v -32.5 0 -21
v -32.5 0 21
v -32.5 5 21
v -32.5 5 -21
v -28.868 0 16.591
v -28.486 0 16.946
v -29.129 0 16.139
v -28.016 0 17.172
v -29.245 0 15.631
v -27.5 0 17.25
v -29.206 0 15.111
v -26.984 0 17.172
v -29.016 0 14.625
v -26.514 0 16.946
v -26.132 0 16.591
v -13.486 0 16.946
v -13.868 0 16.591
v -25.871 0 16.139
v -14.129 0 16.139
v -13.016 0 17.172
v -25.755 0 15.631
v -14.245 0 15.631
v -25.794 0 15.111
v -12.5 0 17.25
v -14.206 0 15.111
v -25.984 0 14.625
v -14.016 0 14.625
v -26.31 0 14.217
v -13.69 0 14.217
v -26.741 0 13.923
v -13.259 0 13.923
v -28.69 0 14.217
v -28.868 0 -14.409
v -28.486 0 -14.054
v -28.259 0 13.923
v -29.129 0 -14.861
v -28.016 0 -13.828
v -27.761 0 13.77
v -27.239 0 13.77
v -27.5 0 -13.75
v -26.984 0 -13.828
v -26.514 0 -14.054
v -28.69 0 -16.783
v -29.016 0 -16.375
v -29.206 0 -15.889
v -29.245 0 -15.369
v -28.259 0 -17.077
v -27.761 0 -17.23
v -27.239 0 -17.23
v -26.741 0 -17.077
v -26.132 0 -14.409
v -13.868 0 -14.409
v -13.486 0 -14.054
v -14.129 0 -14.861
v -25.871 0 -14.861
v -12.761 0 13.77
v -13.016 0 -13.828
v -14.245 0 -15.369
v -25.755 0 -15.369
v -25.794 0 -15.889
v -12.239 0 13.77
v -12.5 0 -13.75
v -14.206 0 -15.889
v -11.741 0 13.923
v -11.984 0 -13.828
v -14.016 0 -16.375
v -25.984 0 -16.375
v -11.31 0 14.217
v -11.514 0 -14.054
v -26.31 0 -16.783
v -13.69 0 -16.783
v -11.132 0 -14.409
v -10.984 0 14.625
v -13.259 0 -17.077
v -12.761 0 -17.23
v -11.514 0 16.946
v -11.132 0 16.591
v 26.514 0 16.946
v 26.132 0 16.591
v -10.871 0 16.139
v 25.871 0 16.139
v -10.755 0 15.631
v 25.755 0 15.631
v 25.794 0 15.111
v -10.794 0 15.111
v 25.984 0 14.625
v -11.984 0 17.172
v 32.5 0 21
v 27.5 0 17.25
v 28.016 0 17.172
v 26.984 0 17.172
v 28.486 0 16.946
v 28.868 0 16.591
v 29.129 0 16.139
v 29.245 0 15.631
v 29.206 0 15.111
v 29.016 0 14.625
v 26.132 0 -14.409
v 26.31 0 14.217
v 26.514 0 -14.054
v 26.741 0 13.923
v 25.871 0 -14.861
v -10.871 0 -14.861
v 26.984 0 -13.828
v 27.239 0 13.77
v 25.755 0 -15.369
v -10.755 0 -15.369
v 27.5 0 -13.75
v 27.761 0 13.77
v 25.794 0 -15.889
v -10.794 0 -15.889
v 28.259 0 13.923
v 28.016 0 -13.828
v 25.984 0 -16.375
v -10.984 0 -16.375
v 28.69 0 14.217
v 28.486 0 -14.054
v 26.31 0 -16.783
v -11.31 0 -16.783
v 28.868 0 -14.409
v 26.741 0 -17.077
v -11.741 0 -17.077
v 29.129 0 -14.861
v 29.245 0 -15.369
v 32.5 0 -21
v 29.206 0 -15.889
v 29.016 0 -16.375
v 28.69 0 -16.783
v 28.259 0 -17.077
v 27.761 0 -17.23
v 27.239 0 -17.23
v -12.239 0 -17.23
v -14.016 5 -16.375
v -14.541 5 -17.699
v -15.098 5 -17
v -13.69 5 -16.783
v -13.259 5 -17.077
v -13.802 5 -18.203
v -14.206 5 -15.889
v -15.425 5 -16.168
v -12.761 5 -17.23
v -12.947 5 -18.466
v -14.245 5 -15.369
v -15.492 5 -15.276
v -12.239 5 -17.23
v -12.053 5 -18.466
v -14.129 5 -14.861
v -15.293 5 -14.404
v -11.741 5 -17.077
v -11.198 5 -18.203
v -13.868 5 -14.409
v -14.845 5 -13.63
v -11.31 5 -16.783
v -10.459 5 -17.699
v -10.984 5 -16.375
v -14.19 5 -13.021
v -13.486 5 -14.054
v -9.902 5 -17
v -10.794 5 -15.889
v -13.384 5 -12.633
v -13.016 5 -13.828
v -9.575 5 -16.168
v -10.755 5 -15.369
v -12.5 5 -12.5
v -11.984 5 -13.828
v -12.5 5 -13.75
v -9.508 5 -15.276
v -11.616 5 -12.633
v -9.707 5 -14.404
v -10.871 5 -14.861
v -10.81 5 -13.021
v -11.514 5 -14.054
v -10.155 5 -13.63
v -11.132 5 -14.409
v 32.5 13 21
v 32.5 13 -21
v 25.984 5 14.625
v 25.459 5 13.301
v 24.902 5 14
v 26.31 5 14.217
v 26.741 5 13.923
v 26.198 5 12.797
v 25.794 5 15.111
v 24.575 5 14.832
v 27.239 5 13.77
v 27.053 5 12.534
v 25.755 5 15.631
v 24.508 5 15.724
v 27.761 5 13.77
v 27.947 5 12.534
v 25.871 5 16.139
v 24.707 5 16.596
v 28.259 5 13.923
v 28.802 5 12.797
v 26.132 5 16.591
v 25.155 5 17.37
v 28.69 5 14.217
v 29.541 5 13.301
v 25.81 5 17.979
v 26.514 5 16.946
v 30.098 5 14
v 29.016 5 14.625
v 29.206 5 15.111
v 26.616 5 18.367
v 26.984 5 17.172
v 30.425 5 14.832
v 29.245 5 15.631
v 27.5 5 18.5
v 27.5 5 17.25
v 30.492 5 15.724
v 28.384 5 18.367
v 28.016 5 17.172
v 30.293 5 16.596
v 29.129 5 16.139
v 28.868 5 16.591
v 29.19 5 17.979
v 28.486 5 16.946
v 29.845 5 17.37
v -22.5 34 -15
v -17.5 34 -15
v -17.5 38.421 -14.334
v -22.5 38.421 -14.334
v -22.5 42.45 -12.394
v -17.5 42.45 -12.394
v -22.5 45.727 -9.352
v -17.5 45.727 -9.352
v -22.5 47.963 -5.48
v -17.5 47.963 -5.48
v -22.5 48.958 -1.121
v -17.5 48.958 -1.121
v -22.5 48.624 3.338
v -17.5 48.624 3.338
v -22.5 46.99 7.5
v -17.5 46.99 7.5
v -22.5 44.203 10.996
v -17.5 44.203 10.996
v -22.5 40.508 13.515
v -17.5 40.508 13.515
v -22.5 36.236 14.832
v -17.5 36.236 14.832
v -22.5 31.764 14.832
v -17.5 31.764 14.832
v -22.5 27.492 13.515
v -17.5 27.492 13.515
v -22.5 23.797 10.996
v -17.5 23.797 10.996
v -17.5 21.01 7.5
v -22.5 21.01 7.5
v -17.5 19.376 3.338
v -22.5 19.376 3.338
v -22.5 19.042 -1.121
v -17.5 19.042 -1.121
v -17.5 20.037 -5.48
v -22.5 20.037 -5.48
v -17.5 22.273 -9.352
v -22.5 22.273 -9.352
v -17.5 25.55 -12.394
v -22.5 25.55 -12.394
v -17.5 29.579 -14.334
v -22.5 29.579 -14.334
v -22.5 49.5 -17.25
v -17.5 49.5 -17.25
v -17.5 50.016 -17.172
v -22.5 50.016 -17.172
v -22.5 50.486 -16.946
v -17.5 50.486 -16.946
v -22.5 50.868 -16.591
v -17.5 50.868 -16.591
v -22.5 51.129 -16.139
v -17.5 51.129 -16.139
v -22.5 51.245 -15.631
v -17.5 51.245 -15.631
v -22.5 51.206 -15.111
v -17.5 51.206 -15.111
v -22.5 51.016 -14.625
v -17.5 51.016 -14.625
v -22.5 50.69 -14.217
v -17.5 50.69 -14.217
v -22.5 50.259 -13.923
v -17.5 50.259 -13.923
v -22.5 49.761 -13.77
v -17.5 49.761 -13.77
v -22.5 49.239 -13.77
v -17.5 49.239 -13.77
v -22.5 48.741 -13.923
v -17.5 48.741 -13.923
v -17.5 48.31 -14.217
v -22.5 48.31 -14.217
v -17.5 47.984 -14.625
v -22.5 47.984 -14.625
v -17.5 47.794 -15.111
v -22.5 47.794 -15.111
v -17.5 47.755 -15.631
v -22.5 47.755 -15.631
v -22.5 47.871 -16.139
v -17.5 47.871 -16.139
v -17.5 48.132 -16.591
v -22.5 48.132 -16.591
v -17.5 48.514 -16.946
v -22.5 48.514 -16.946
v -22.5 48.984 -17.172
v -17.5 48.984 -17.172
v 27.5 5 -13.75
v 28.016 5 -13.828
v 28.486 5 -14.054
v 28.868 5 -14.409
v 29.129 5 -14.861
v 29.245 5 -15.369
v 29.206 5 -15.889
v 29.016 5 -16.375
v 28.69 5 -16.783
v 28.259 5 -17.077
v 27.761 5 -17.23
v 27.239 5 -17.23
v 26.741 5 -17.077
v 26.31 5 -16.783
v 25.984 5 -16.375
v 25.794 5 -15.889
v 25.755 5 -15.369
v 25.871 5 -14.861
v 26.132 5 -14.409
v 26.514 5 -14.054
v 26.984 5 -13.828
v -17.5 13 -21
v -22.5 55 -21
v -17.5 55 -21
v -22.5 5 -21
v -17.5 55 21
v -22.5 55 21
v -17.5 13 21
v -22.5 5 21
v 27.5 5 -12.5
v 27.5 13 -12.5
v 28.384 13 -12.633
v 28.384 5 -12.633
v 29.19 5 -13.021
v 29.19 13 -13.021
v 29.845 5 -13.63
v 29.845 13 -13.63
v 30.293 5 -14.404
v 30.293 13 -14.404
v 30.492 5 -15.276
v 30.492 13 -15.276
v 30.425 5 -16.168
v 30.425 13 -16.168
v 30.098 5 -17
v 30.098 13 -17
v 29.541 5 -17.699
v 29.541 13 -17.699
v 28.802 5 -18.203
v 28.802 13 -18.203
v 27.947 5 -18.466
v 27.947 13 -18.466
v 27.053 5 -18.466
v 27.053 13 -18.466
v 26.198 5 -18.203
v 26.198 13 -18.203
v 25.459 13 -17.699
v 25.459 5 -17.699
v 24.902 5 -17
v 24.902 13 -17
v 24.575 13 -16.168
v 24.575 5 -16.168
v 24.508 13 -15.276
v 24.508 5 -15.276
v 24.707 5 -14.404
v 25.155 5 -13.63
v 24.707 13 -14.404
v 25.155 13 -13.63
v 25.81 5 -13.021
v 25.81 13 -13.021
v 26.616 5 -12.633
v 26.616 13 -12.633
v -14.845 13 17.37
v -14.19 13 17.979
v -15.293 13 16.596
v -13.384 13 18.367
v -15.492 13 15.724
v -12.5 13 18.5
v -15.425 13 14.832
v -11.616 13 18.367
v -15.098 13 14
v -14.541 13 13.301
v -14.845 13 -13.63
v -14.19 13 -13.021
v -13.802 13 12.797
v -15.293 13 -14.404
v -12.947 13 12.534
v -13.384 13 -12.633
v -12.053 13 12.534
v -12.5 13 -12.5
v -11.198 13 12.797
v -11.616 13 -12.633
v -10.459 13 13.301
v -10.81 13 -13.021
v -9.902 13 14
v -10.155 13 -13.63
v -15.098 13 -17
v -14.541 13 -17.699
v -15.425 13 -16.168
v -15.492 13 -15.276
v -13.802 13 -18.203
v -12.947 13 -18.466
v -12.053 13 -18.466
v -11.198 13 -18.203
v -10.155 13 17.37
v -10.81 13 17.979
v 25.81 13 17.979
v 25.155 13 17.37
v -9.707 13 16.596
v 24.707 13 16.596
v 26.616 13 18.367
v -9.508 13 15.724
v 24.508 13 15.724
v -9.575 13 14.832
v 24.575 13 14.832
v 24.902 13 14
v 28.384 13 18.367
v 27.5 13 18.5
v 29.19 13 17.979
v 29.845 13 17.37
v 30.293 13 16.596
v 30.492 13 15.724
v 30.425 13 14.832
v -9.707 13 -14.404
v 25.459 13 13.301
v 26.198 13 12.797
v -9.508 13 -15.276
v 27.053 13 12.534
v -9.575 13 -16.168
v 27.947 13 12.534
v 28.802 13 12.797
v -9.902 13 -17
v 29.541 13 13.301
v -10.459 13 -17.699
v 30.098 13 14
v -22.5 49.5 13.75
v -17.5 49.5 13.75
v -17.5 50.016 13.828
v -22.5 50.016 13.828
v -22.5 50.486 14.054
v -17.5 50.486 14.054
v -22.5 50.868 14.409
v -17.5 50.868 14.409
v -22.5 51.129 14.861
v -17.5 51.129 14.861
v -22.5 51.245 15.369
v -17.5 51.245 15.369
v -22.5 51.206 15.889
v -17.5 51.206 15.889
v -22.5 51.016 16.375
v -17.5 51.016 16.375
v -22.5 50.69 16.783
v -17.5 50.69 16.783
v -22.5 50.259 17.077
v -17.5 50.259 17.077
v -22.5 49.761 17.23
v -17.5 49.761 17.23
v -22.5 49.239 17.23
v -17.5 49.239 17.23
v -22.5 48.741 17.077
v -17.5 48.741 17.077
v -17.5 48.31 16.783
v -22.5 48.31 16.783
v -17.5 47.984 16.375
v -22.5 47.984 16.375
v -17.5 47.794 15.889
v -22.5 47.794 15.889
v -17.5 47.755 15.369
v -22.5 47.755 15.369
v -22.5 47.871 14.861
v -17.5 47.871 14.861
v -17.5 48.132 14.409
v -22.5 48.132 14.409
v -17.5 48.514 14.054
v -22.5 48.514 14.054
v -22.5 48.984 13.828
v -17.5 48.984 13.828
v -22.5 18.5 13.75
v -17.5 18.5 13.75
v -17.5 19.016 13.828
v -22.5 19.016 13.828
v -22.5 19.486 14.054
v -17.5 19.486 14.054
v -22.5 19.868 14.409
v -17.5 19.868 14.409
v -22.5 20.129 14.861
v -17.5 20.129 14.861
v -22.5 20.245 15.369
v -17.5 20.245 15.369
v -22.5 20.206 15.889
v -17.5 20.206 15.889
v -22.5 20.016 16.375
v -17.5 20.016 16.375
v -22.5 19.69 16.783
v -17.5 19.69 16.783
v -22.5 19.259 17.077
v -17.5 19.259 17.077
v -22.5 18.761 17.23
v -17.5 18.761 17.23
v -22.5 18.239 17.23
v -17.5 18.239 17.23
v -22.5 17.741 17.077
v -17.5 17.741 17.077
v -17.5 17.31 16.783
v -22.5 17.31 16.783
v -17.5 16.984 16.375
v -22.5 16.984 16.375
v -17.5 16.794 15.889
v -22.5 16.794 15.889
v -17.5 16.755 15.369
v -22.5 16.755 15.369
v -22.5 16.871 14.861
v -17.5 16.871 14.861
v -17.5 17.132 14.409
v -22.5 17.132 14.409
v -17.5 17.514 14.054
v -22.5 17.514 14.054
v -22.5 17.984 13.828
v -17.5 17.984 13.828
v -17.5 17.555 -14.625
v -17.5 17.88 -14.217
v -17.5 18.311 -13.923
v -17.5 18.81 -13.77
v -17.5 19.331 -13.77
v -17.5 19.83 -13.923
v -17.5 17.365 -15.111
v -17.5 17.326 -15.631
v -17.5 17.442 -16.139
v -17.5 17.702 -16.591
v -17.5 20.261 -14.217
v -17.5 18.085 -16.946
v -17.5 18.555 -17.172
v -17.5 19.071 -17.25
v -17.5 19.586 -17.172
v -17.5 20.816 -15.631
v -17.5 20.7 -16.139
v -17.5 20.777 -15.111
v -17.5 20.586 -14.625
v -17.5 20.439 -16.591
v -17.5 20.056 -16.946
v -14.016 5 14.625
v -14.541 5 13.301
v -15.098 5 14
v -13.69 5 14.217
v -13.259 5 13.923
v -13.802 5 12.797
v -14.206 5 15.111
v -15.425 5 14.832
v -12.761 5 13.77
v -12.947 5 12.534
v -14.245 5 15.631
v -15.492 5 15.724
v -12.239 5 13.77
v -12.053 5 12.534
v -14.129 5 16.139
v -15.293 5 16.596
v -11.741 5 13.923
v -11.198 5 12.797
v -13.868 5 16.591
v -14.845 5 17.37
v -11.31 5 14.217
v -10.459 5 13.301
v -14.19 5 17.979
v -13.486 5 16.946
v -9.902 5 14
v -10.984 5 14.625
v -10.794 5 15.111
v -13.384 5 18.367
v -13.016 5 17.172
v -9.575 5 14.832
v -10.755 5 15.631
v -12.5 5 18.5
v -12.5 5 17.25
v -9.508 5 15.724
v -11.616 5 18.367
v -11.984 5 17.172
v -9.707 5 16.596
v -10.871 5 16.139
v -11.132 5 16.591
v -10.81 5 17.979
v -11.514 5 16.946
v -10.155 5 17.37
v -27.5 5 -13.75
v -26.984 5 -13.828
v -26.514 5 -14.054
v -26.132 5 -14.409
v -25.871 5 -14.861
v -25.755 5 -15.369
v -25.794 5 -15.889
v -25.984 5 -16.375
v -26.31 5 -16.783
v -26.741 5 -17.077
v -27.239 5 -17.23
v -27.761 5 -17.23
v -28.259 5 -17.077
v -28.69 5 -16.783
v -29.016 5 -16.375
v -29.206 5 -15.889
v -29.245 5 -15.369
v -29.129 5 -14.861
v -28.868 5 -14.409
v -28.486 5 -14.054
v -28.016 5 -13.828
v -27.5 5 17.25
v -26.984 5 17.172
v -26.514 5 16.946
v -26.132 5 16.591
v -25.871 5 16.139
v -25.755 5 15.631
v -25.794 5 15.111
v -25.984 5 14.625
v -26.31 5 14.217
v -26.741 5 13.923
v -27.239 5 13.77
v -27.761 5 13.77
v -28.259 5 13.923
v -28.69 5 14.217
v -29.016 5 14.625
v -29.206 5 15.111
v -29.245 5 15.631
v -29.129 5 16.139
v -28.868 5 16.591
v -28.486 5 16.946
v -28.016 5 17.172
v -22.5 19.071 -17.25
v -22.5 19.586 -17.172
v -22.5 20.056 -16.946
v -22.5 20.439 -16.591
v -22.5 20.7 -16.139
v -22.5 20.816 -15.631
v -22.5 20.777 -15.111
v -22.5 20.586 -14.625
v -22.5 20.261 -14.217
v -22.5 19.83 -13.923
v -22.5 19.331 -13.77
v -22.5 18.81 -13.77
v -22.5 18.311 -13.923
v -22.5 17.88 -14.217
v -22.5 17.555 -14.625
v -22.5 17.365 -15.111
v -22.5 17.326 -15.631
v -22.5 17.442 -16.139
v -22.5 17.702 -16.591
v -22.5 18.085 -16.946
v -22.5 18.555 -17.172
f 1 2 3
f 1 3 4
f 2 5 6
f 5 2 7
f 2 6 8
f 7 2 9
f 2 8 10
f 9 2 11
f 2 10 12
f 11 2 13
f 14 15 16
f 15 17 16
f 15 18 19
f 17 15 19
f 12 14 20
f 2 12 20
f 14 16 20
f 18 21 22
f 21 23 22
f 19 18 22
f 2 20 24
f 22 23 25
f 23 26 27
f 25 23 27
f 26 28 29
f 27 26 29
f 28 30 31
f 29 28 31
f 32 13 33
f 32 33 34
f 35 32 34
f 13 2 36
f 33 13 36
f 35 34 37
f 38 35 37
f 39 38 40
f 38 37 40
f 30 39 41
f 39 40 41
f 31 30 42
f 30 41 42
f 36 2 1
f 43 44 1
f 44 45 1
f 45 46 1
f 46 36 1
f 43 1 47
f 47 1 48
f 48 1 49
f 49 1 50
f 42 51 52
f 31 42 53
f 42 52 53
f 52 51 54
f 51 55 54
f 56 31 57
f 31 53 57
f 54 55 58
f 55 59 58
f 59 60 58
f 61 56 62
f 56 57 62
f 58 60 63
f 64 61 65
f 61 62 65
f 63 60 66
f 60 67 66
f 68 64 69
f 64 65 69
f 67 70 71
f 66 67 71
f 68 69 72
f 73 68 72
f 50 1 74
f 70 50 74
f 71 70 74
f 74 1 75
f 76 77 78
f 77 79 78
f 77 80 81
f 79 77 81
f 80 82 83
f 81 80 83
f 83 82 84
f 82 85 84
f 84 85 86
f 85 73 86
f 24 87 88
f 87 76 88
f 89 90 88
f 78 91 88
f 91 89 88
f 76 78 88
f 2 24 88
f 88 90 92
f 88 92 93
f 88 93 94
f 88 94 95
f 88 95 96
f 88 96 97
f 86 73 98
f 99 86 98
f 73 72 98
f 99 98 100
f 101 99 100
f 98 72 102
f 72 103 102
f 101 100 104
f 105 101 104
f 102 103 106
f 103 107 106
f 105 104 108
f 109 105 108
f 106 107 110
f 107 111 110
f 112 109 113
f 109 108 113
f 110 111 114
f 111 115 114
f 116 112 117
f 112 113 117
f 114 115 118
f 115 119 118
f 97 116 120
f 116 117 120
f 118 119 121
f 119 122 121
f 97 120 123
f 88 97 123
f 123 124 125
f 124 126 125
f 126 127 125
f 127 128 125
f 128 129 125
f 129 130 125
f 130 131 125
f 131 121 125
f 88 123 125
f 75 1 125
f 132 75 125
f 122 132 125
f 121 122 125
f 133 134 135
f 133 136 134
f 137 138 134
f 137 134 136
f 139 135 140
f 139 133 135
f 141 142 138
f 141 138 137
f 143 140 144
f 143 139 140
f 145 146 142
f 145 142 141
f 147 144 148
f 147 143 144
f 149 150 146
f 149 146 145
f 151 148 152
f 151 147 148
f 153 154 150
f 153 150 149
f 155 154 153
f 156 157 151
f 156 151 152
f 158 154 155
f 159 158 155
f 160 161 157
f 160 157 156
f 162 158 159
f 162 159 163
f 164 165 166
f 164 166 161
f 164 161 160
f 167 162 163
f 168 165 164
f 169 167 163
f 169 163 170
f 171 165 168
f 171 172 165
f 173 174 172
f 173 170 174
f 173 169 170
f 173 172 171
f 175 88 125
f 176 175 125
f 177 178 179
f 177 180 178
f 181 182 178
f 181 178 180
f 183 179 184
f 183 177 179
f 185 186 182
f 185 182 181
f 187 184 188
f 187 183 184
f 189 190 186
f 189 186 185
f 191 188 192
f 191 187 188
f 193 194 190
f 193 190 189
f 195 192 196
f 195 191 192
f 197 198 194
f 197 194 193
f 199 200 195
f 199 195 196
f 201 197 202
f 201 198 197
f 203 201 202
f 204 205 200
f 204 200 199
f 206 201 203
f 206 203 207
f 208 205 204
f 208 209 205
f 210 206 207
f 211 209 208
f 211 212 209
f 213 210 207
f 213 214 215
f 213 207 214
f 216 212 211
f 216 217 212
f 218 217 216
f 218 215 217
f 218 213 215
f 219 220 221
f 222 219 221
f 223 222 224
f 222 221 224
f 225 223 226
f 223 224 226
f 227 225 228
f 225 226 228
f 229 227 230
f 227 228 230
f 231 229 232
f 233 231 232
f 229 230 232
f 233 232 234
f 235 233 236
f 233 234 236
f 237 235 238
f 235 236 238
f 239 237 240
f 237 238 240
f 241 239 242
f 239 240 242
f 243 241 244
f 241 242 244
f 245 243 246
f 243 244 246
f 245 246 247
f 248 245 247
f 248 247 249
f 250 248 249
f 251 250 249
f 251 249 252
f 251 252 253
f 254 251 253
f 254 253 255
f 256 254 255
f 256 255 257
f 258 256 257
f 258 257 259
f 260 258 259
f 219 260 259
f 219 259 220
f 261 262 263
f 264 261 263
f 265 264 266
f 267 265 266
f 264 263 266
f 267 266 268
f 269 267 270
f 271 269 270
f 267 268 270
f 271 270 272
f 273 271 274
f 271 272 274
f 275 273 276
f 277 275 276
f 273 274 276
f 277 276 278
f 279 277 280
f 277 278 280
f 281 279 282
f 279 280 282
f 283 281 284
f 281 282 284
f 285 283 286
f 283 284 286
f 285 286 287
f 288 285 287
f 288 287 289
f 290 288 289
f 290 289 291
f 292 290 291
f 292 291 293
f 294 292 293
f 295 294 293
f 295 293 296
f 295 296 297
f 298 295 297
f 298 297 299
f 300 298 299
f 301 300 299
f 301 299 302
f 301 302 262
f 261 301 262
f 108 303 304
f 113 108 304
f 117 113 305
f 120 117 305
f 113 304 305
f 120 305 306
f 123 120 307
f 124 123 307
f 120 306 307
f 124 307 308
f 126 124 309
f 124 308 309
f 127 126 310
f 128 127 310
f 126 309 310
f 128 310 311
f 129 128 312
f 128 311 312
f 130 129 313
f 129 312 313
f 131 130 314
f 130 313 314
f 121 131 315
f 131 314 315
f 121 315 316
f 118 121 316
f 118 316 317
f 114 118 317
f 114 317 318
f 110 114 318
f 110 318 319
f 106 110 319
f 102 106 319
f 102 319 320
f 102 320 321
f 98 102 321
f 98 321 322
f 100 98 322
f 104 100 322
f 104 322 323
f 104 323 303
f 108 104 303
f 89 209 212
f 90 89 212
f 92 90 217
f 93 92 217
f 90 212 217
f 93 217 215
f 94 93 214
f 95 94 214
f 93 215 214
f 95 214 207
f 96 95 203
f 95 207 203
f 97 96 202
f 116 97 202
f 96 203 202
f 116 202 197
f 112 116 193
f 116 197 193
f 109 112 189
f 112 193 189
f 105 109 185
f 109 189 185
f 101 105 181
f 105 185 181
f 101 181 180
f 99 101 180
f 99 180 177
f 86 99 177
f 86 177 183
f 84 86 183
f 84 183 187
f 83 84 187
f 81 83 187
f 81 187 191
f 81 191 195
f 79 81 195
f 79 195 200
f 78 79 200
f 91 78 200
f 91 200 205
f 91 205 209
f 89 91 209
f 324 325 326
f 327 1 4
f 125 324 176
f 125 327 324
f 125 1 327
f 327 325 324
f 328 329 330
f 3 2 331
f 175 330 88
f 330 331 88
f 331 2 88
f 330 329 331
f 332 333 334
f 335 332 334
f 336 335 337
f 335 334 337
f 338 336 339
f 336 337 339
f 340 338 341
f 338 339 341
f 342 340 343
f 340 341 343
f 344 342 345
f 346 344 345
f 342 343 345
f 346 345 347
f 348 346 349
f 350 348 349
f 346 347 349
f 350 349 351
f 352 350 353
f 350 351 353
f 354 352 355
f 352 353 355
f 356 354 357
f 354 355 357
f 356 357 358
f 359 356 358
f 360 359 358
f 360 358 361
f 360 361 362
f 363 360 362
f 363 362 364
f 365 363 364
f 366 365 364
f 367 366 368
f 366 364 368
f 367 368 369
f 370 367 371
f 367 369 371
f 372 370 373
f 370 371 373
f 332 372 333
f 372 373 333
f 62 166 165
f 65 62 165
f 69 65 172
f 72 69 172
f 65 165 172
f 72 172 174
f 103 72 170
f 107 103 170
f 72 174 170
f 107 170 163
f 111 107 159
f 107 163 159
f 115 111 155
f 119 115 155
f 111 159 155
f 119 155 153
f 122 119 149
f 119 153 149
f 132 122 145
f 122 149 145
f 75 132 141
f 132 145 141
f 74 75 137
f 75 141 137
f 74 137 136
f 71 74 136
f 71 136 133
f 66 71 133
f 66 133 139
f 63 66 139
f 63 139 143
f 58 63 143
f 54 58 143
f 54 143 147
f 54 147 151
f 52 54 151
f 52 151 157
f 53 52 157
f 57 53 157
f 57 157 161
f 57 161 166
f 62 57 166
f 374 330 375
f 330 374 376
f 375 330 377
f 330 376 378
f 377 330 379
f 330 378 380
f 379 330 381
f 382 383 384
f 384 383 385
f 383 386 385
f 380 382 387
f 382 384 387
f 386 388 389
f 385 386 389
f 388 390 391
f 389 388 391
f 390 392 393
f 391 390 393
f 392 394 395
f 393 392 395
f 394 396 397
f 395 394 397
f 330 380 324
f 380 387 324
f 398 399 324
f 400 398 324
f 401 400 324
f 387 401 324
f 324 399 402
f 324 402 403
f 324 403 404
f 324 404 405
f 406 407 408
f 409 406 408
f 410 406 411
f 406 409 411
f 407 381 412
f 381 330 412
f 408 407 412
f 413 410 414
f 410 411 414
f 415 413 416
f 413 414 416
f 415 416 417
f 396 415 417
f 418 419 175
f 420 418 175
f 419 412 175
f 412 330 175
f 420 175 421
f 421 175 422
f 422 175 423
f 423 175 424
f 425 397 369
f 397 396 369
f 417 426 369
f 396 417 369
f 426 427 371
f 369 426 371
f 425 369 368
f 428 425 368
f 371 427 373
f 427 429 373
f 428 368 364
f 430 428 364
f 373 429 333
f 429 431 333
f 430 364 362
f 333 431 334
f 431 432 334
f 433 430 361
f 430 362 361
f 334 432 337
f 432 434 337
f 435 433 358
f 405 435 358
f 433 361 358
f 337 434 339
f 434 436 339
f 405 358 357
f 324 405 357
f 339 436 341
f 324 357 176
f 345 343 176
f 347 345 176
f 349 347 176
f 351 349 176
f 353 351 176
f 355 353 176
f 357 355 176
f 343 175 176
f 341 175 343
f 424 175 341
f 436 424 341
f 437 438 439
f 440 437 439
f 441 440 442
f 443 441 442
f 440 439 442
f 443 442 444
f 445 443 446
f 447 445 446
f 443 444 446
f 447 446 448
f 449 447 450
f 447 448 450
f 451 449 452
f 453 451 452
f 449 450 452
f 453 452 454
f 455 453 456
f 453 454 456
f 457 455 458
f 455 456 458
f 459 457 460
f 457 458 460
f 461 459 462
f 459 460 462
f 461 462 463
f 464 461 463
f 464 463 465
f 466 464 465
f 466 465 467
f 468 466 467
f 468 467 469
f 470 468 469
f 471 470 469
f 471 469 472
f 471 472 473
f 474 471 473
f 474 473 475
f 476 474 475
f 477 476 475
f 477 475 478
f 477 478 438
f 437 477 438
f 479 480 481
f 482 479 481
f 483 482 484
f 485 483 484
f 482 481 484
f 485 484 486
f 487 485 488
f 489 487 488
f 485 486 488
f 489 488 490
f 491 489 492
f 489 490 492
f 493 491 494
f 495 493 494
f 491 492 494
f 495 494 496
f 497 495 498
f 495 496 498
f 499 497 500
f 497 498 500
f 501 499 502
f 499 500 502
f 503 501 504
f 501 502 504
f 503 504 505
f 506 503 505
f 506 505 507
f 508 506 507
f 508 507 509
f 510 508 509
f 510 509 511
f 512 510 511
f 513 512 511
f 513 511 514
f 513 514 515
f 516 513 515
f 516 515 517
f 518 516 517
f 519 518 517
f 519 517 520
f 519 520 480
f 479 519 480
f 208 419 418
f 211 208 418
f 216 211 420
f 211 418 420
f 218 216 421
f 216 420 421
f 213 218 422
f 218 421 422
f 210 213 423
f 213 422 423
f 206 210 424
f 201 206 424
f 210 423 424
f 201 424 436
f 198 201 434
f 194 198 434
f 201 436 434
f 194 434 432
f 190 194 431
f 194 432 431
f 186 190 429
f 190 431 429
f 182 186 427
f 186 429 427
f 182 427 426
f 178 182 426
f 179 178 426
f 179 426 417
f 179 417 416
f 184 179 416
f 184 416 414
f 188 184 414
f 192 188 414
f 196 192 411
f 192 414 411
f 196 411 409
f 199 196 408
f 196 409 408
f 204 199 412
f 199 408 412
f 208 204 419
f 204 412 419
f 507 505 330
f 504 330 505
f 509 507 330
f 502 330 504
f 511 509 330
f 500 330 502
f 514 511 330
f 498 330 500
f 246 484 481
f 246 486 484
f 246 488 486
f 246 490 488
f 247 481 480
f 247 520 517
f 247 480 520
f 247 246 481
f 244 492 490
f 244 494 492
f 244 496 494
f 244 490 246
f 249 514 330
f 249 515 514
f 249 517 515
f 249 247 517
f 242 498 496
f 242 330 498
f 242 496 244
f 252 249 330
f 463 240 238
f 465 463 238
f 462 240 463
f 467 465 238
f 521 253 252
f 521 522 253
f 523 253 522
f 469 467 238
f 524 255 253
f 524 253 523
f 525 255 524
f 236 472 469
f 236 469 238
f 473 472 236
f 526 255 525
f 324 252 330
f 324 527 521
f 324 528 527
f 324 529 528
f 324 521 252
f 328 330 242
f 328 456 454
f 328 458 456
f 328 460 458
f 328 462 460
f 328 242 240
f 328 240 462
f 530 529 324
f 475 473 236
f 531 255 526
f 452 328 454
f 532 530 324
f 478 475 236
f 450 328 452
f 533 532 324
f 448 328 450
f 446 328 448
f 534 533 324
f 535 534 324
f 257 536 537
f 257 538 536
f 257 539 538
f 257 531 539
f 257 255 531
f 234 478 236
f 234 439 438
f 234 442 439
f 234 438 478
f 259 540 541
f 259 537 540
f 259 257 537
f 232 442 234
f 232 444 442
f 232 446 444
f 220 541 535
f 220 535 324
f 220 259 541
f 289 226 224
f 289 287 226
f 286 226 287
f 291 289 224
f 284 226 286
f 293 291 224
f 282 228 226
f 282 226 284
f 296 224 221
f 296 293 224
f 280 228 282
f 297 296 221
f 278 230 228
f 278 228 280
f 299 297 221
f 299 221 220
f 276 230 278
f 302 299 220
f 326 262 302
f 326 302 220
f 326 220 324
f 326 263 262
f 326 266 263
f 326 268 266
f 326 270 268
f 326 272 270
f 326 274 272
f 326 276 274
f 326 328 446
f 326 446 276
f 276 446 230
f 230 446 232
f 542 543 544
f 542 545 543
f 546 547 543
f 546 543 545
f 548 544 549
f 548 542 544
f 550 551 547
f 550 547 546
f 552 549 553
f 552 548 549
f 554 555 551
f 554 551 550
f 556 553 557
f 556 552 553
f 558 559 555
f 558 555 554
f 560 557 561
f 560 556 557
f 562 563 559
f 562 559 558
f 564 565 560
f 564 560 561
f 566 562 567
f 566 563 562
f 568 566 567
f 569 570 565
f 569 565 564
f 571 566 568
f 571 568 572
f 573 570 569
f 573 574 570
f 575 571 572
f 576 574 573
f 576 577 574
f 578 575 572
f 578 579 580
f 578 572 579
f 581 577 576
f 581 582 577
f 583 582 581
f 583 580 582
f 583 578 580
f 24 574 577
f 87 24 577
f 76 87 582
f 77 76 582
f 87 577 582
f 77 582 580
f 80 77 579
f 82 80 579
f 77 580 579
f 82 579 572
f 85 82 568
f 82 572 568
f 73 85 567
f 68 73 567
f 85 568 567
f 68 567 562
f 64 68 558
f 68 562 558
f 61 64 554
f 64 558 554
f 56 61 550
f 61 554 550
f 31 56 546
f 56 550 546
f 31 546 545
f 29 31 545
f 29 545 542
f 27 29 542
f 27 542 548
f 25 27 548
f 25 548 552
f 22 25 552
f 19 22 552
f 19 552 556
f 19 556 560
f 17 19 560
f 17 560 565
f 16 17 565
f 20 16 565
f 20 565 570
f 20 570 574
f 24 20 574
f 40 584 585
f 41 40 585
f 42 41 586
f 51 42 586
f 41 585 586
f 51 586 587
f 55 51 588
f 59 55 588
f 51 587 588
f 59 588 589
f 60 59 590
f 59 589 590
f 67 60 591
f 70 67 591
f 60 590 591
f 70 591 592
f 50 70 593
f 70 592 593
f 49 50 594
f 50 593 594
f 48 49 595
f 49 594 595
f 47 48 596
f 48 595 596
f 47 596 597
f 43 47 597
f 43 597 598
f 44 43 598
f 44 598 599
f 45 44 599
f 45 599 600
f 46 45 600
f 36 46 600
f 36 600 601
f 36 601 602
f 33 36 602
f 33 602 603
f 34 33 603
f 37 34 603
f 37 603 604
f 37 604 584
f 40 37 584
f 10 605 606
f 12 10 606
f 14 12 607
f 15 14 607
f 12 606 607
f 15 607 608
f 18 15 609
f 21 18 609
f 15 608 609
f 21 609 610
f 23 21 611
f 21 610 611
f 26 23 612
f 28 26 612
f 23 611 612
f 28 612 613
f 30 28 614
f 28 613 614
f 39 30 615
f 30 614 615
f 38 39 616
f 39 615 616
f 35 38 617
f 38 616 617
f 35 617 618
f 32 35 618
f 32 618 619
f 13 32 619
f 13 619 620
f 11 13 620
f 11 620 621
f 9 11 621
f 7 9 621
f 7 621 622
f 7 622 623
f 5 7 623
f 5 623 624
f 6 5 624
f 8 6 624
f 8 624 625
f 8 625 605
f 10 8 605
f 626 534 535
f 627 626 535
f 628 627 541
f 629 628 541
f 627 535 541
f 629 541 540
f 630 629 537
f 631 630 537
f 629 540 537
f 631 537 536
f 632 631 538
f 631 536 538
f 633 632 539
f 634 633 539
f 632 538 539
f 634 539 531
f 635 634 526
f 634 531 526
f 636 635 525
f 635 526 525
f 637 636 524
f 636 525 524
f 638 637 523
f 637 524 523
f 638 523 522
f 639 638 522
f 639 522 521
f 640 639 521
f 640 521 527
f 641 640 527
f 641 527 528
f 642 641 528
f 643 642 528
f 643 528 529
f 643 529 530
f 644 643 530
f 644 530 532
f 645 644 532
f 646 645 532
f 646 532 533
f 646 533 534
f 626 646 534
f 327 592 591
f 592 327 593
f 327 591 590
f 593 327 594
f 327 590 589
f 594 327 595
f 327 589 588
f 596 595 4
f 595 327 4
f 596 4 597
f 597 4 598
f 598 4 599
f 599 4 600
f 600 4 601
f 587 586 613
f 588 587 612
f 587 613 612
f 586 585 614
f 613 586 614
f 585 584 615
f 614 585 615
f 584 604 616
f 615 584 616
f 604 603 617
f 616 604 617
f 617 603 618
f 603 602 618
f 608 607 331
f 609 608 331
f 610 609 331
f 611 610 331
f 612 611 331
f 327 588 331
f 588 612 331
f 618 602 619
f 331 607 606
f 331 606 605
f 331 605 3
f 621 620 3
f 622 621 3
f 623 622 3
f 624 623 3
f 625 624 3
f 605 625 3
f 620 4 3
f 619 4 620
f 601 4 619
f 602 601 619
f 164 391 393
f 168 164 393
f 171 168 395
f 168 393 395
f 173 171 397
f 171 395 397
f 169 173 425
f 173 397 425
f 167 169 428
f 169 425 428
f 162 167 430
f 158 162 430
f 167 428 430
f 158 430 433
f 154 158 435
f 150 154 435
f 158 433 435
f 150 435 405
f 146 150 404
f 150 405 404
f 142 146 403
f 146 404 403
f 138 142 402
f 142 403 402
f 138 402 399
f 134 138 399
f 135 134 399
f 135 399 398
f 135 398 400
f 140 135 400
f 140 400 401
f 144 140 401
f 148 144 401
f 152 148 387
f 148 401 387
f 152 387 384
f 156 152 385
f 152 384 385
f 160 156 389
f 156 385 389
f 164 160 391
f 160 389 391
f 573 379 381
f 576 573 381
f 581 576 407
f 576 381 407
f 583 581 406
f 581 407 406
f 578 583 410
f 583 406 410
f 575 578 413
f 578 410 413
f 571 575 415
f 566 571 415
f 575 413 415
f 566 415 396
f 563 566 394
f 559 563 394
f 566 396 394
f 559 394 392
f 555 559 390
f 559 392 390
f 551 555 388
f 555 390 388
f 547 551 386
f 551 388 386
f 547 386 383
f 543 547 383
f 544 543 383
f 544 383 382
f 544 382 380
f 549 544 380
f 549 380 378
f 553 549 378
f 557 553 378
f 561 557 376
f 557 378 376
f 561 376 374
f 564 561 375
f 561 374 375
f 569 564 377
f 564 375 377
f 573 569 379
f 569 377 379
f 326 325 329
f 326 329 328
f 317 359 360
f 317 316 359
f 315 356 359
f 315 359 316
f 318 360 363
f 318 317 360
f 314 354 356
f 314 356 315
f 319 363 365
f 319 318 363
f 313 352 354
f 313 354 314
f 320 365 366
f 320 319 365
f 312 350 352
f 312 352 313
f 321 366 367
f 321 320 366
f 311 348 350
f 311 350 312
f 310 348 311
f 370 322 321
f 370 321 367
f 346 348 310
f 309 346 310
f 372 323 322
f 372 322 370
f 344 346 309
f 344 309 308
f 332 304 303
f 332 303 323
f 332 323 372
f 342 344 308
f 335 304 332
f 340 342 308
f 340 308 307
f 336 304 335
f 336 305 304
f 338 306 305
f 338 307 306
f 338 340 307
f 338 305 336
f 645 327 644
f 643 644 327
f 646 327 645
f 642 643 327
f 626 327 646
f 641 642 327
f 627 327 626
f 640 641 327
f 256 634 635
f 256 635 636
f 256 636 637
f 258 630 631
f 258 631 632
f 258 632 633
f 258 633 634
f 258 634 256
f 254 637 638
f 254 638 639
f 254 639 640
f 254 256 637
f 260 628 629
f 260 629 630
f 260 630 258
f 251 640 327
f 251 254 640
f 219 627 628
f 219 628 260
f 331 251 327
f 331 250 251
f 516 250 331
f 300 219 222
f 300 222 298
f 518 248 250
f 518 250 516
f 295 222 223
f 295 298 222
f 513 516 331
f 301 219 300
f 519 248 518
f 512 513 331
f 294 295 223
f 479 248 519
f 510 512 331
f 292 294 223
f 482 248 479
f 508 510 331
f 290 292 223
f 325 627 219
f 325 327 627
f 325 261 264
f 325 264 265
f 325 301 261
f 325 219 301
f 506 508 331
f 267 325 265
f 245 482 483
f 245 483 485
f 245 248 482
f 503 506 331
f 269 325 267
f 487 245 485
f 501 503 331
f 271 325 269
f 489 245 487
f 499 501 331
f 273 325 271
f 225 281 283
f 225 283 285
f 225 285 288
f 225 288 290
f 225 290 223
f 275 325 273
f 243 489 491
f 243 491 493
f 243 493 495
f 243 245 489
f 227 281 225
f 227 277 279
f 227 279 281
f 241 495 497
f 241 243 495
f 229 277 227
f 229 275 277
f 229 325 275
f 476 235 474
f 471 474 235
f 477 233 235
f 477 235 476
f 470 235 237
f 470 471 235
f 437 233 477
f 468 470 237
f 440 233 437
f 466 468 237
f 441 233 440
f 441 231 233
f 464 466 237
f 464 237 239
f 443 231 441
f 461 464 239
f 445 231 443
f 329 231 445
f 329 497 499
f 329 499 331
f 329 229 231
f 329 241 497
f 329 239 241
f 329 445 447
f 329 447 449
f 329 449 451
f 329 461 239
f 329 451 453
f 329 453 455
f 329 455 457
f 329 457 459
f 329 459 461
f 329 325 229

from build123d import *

# Parameters (mm, degrees)
ESBO_O1_W                = 65
ESBO_O1_H                = 42
RESSALTO_EXTRUS_O1_DEPTH = 55
ESBO_O2_W                = 42
ESBO_O2_H                = 50
CORTE_EXTRUS_O1_DEPTH    = 10
ESBO_O3_W                = 42
ESBO_O3_H                = 42
CORTE_EXTRUS_O2_DEPTH    = 50
ESBO_O4_R                = 1.75
CORTE_EXTRUS_O3_DEPTH    = 78.239886069
ESBO_O5_R                = 1.75
CORTE_EXTRUS_O4_DEPTH    = 64.223808806
ESBO_O6_R                = 1.75
CORTE_EXTRUS_O5_DEPTH    = 58.107355043
ESBO_O7_R                = 3
CORTE_EXTRUS_O6_DEPTH    = 8
ESBO_O8_R                = 15
CORTE_EXTRUS_O7_DEPTH    = 78.239886069


with BuildPart() as part:
    # Esboço1 → Ressalto-extrusão1 (new body)
    with BuildSketch(Plane(origin=(0, 0, 0), x_dir=(1, 0, 0), z_dir=(0, 1, 0))):
        Rectangle(ESBO_O1_W, ESBO_O1_H)
    extrude(amount=RESSALTO_EXTRUS_O1_DEPTH)

    # Esboço2 → Corte-extrusão1 (cut)
    with BuildSketch(Plane.ZY.offset(32.5)):
        with Locations((0, 30)):
            Rectangle(ESBO_O2_W, ESBO_O2_H)
    extrude(amount=-CORTE_EXTRUS_O1_DEPTH, mode=Mode.SUBTRACT)

    # Esboço3 → Corte-extrusão2 (cut)
    with BuildSketch(Plane(origin=(32.5, 0, 0), x_dir=(0, 0, -1), z_dir=(1, 0, 0))):
        with Locations((0, 34)):
            Rectangle(ESBO_O3_W, ESBO_O3_H)
    extrude(amount=-CORTE_EXTRUS_O2_DEPTH, mode=Mode.SUBTRACT)

    # Esboço4 → Corte-extrusão3 (cut, through all)
    with BuildSketch(Plane(origin=(-17.5, 0, 0), x_dir=(0, 0, -1), z_dir=(1, 0, 0))):
        with Locations((-15.5, 49.5)):
            Circle(ESBO_O4_R)
        with Locations((15.5, 49.5)):
            Circle(ESBO_O4_R)
        with Locations((15.5, 19.070664067)):
            Circle(ESBO_O4_R)
        with Locations((-15.5, 18.5)):
            Circle(ESBO_O4_R)
    extrude(amount=-CORTE_EXTRUS_O3_DEPTH, mode=Mode.SUBTRACT)

    # Esboço5 → Corte-extrusão4 (cut, through all)
    with BuildSketch(Plane(origin=(0, 5, 0), x_dir=(1, 0, 0), z_dir=(0, 1, 0))):
        with Locations(Location((-27.5, 15.5, 0), (0, 0, 270))):
            Circle(ESBO_O5_R)
        with Locations(Location((-27.5, -15.5, 0), (0, 0, 270))):
            Circle(ESBO_O5_R)
    extrude(amount=-CORTE_EXTRUS_O4_DEPTH, mode=Mode.SUBTRACT)

    # Esboço6 → Corte-extrusão5 (cut, through all)
    with BuildSketch(Plane(origin=(0, 13, 0), x_dir=(1, 0, 0), z_dir=(0, 1, 0))):
        with Locations(Location((-12.5, 15.5, 0), (0, 0, 270))):
            Circle(ESBO_O6_R)
        with Locations(Location((27.5, 15.5, 0), (0, 0, 270))):
            Circle(ESBO_O6_R)
        with Locations(Location((27.5, -15.5, 0), (0, 0, 270))):
            Circle(ESBO_O6_R)
        with Locations(Location((-12.5, -15.5, 0), (0, 0, 270))):
            Circle(ESBO_O6_R)
    extrude(amount=-CORTE_EXTRUS_O5_DEPTH, mode=Mode.SUBTRACT)

    # Esboço7 → Corte-extrusão6 (cut)
    with BuildSketch(Plane(origin=(0, 13, 0), x_dir=(1, 0, 0), z_dir=(0, 1, 0))):
        with Locations(Location((-12.5, 15.5, 0), (0, 0, 270))):
            Circle(ESBO_O7_R)
        with Locations(Location((27.5, 15.5, 0), (0, 0, 270))):
            Circle(ESBO_O7_R)
        with Locations(Location((27.5, -15.5, 0), (0, 0, 270))):
            Circle(ESBO_O7_R)
        with Locations(Location((-12.5, -15.5, 0), (0, 0, 270))):
            Circle(ESBO_O7_R)
    extrude(amount=-CORTE_EXTRUS_O6_DEPTH, mode=Mode.SUBTRACT)

    # Esboço8 → Corte-extrusão7 (cut, through all)
    with BuildSketch(Plane(origin=(-17.5, 0, 0), x_dir=(0, 0, -1), z_dir=(1, 0, 0))):
        with Locations((0, 34)):
            Circle(ESBO_O8_R)
    extrude(amount=-CORTE_EXTRUS_O7_DEPTH, mode=Mode.SUBTRACT)


solid = part.part
